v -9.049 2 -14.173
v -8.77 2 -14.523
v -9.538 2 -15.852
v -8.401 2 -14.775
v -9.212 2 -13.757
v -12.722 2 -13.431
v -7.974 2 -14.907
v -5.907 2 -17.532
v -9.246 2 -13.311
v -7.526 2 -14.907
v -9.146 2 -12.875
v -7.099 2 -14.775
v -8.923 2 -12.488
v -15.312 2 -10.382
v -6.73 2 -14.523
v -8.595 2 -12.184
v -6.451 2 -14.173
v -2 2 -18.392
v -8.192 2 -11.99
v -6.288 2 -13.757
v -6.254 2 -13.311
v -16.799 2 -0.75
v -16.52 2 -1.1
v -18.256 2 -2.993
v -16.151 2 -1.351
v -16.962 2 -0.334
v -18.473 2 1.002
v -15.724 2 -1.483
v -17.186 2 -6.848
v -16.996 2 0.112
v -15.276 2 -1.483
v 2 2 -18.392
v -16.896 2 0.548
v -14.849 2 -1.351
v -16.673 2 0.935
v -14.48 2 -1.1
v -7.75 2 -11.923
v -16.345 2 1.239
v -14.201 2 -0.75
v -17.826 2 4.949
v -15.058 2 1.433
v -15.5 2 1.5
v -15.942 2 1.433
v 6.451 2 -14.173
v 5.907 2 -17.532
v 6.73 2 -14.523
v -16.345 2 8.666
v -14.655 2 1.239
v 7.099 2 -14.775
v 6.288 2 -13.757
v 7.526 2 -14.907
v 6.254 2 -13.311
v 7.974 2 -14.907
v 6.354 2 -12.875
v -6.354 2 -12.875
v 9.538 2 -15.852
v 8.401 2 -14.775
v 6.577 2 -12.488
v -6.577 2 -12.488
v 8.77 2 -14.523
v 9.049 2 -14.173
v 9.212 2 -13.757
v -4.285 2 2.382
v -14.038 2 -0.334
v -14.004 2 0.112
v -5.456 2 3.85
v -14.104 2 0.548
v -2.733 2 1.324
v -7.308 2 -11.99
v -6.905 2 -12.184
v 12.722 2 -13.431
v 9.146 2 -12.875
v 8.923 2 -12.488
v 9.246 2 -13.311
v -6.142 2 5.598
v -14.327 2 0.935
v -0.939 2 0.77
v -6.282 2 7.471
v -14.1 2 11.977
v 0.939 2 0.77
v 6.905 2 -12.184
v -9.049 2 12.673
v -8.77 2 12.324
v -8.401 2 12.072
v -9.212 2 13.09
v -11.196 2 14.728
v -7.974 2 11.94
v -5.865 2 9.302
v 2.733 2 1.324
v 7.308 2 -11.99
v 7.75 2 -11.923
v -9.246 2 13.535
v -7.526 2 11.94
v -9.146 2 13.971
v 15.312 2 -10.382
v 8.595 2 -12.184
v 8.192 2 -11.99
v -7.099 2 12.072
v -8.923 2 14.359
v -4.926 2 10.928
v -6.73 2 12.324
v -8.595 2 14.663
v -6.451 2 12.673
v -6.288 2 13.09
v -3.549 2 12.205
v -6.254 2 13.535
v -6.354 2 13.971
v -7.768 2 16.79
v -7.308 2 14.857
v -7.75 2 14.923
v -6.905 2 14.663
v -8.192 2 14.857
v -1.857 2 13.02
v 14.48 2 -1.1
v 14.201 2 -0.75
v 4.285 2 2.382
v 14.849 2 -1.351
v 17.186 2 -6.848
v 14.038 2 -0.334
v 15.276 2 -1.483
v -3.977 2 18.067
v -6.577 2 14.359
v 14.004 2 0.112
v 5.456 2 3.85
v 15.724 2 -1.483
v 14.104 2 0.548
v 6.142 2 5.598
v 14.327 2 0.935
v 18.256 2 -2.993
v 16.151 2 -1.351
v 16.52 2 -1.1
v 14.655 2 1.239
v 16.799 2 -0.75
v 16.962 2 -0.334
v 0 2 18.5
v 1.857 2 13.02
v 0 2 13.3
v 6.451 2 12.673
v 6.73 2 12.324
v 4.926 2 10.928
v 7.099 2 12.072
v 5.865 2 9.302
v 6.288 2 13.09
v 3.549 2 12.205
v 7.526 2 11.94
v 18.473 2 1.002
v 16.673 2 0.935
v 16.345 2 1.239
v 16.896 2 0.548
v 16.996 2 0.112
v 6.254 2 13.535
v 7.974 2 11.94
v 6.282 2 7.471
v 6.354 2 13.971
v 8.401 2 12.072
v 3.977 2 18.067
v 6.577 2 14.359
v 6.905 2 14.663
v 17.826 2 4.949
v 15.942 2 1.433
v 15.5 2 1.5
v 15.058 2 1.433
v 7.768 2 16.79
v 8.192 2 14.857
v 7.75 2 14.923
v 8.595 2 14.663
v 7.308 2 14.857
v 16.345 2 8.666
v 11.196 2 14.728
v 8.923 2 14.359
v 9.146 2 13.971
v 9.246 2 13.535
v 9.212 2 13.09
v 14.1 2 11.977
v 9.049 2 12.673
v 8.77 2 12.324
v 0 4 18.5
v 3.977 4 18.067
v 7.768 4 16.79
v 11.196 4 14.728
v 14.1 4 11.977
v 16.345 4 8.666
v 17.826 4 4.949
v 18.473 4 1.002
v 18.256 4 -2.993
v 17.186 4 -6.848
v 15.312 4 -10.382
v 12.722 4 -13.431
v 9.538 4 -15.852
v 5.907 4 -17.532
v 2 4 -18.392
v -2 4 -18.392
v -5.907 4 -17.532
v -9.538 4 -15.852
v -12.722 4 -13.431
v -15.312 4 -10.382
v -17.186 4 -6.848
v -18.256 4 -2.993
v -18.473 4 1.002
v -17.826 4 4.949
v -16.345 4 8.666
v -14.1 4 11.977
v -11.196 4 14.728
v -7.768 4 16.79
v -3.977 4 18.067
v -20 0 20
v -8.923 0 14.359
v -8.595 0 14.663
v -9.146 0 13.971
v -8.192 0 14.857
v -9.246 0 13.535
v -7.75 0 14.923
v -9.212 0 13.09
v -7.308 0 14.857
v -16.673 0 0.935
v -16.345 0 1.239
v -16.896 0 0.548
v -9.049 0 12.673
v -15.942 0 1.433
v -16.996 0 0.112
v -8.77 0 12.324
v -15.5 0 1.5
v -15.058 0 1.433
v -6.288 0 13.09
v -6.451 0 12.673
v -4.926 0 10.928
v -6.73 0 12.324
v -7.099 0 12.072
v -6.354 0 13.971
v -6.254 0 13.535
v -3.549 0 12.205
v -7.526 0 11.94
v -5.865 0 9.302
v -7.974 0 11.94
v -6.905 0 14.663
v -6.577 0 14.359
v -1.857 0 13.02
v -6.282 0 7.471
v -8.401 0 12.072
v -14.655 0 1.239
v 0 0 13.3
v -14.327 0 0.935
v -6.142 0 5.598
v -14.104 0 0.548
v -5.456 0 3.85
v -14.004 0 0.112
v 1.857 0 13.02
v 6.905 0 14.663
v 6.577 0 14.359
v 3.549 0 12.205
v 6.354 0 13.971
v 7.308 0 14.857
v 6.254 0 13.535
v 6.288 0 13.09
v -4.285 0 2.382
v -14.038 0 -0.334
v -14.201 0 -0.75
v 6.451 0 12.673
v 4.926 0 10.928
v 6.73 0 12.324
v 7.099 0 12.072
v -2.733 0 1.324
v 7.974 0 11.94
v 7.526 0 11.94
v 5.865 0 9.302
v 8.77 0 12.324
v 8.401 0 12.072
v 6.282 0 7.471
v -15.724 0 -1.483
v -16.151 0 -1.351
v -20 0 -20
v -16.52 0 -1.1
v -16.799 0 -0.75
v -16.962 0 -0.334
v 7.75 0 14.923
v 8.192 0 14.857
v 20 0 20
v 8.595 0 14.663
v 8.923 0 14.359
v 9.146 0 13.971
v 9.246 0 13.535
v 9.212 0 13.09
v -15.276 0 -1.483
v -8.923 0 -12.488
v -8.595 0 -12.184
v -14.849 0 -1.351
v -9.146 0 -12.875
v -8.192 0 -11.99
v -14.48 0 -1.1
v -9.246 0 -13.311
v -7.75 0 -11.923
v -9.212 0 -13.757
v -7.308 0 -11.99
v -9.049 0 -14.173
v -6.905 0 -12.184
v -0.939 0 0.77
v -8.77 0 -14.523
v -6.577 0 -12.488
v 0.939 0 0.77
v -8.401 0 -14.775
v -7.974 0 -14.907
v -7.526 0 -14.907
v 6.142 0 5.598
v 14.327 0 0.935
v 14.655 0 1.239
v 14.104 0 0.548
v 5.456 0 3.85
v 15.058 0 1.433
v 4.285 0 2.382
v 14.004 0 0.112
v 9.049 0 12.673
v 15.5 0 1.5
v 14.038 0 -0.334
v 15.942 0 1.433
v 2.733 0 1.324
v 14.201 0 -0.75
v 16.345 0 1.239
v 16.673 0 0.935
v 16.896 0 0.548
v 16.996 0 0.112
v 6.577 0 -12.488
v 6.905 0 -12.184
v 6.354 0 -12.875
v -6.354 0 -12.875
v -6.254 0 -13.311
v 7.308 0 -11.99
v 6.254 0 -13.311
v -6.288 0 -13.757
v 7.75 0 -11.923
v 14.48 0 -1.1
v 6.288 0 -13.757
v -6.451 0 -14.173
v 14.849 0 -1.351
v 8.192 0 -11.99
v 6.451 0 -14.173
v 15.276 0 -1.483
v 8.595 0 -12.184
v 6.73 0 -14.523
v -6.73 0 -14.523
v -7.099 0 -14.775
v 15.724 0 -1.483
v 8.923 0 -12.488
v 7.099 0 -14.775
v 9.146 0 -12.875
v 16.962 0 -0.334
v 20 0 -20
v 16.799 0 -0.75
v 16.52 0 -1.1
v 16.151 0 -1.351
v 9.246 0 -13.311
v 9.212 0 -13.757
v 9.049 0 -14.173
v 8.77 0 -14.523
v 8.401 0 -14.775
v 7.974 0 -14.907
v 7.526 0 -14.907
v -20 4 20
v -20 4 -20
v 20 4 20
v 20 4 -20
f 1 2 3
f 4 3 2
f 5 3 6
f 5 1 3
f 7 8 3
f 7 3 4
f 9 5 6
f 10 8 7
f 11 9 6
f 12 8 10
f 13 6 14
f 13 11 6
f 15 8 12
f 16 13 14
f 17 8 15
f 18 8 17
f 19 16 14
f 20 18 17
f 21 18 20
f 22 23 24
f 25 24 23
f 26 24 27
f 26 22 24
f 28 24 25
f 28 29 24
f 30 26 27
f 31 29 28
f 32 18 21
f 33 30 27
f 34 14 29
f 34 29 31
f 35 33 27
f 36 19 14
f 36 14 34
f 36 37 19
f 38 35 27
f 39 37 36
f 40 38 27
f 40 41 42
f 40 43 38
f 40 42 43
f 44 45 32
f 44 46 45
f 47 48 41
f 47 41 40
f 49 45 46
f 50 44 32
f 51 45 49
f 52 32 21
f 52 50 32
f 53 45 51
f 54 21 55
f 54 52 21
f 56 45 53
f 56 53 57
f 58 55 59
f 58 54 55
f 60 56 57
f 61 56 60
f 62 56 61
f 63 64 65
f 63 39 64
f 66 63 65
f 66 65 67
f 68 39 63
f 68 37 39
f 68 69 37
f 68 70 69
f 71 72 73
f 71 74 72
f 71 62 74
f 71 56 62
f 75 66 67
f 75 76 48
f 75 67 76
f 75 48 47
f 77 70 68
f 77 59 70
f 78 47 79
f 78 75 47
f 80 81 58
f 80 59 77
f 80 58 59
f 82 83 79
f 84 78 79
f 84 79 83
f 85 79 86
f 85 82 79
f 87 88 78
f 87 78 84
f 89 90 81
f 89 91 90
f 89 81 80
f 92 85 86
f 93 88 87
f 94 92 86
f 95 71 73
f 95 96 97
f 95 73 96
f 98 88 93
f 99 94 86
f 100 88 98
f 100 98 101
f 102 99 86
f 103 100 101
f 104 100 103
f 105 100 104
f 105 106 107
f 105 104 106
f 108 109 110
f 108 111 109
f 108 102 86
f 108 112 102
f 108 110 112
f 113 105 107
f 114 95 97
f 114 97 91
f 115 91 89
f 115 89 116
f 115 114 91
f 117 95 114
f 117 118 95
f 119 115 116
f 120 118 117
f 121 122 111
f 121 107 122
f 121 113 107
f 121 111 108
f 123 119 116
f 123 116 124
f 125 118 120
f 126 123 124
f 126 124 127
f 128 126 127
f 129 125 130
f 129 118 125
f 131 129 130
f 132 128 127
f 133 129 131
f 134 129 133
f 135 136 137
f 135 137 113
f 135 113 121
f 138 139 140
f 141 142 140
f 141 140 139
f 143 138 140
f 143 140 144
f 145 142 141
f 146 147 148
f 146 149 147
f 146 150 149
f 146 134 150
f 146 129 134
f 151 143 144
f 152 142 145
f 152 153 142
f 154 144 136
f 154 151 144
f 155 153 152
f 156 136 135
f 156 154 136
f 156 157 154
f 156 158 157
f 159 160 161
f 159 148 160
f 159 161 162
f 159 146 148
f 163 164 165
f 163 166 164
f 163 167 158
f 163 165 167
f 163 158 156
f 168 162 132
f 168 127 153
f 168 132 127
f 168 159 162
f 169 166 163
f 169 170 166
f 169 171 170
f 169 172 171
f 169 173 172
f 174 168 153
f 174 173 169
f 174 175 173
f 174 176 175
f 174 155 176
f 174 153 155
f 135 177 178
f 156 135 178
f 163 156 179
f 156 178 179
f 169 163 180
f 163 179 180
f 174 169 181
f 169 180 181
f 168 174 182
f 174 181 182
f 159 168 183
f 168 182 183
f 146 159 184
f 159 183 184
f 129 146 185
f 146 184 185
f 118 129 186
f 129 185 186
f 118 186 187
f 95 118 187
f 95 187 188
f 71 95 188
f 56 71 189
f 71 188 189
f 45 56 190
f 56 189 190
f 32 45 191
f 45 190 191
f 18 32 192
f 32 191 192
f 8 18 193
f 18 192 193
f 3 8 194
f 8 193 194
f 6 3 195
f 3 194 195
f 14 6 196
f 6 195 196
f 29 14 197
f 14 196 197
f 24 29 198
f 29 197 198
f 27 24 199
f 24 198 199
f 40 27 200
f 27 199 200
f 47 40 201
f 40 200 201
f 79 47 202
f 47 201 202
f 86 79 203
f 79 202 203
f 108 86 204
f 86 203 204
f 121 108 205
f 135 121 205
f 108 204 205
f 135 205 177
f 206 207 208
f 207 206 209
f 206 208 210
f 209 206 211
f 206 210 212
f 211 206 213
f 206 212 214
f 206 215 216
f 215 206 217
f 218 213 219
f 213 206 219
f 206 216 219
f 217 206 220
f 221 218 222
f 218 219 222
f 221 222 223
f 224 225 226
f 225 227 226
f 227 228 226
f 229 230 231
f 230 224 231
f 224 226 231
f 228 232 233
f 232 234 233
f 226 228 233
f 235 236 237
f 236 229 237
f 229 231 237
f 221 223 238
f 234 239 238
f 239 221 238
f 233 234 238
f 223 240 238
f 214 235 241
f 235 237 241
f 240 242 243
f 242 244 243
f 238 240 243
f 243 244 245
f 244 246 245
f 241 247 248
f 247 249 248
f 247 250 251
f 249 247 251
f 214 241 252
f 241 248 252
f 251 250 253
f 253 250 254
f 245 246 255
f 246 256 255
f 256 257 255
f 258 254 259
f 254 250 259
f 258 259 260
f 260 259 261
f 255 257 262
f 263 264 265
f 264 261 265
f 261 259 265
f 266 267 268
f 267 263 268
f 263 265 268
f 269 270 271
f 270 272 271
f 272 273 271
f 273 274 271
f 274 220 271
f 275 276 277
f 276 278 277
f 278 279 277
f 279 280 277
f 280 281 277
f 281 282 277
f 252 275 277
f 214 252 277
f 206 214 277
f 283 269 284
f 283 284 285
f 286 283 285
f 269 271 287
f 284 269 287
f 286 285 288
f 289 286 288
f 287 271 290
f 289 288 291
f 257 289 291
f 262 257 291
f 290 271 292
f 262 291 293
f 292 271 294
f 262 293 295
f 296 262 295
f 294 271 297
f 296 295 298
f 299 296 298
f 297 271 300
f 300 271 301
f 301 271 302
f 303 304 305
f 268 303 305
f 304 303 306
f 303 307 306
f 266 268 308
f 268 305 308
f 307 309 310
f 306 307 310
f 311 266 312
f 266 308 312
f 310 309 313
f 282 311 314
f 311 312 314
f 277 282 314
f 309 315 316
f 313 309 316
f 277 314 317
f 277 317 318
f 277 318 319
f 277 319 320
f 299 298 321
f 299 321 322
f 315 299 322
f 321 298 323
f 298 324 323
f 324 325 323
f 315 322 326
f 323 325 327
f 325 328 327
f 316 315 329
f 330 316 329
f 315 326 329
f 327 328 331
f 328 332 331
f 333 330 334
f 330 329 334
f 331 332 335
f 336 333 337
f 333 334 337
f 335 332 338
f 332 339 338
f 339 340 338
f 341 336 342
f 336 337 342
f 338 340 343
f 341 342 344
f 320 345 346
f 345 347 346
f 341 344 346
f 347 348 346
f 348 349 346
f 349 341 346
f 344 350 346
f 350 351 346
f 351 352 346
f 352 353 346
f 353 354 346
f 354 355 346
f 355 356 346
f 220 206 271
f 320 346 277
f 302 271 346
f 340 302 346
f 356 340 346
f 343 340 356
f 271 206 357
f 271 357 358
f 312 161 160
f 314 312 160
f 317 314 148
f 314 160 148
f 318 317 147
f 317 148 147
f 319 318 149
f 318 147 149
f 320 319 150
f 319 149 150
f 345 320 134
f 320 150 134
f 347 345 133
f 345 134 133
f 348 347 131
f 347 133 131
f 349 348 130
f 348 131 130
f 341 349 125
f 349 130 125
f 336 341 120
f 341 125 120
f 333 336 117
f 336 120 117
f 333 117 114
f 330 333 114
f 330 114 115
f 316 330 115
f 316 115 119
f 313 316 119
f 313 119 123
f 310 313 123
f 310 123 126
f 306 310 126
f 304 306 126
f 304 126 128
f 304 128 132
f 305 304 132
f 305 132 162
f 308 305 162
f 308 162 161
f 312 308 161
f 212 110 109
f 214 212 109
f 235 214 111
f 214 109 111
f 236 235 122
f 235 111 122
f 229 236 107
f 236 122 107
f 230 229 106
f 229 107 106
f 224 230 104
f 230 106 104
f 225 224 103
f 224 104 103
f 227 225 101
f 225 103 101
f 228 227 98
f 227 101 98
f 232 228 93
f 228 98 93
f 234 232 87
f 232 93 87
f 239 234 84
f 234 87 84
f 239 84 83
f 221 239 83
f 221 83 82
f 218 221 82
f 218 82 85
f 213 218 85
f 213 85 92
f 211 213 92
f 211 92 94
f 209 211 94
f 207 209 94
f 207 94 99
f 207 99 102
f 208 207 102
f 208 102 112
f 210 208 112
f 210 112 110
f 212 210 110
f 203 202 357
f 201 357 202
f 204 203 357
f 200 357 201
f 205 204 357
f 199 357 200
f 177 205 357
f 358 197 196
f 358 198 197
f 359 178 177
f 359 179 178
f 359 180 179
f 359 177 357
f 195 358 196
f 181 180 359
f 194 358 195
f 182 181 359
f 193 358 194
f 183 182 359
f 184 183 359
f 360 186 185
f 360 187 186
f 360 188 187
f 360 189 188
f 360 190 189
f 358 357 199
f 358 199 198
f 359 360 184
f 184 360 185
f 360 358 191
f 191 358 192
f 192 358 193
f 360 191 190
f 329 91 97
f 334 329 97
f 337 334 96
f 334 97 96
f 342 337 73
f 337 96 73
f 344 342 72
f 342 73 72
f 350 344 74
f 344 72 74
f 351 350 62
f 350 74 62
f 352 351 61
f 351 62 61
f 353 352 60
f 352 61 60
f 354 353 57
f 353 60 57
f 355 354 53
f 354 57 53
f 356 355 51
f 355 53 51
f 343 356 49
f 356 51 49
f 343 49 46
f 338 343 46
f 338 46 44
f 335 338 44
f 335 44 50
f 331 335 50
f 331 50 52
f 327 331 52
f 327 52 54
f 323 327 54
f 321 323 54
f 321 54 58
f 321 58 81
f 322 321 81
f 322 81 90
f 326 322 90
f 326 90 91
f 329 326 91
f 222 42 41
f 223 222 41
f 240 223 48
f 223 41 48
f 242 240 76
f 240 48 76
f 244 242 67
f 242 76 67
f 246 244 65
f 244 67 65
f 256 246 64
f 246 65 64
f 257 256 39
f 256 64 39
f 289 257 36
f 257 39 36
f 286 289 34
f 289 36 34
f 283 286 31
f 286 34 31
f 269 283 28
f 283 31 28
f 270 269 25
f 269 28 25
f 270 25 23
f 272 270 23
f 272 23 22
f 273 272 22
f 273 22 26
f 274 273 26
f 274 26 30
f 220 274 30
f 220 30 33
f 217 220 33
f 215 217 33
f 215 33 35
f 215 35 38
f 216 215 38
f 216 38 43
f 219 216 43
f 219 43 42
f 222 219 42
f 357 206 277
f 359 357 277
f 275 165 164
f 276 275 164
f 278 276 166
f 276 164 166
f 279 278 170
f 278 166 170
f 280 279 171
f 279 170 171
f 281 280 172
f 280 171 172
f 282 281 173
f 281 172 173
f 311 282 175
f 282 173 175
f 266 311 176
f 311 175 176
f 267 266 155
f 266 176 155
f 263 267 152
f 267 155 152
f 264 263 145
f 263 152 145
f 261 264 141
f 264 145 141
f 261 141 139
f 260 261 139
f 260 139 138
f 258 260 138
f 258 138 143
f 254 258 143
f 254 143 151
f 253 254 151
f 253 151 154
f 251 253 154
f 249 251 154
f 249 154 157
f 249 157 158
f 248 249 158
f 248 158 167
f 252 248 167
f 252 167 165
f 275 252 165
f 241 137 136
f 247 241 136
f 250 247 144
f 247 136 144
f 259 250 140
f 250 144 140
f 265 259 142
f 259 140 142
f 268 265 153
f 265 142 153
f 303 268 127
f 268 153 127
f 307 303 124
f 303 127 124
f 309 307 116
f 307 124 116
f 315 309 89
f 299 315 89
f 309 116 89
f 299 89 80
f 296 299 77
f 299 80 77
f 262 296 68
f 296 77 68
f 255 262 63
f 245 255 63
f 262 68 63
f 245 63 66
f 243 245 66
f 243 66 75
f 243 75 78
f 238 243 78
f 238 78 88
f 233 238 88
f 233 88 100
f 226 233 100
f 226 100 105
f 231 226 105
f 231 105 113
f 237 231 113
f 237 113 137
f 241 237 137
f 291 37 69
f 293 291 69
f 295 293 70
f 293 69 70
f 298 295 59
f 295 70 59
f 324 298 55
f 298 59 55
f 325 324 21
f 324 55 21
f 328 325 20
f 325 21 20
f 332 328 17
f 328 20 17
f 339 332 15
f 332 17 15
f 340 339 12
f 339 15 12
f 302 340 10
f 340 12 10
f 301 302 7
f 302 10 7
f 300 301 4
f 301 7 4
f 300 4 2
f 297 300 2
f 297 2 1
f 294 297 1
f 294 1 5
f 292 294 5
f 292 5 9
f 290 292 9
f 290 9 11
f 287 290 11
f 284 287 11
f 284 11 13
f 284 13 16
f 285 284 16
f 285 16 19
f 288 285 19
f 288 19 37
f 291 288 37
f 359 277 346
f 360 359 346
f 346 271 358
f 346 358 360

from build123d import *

# Parameters (mm, degrees)
SKETCH1_W           = 40
SKETCH1_H           = 40
BOSS_EXTRUDE1_DEPTH = 4
SKETCH2_R           = 6.3
SKETCH2_R_2         = 1.5
CUT_EXTRUDE2_DEPTH  = 5
SKETCH3_R           = 18.5
CUT_EXTRUDE3_DEPTH  = 2


with BuildPart() as part:
    # Sketch1 → Boss-Extrude1 (new body)
    with BuildSketch(Plane(origin=(0, 0, 0), x_dir=(1, 0, 0), z_dir=(0, 1, 0))):
        Rectangle(SKETCH1_W, SKETCH1_H)
    extrude(amount=BOSS_EXTRUDE1_DEPTH)

    # Sketch2 → Cut-Extrude2 (cut)
    with BuildSketch(Plane(origin=(0, 4, 0), x_dir=(1, 0, 0), z_dir=(0, 1, 0))):
        with Locations(Location((0, -7, 0), (0, 0, 270))):
            Circle(SKETCH2_R)
        with Locations(Location((15.5, 0, 0), (0, 0, 270))):
            Circle(SKETCH2_R_2)
        with Locations(Location((7.75, -13.423393759, 0), (0, 0, 270))):
            Circle(SKETCH2_R_2)
        with Locations(Location((-7.75, -13.423393759, 0), (0, 0, 270))):
            Circle(SKETCH2_R_2)
        with Locations(Location((-15.5, 0, 0), (0, 0, 270))):
            Circle(SKETCH2_R_2)
        with Locations(Location((-7.75, 13.423393759, 0), (0, 0, 270))):
            Circle(SKETCH2_R_2)
        with Locations(Location((7.75, 13.423393759, 0), (0, 0, 270))):
            Circle(SKETCH2_R_2)
    extrude(amount=-CUT_EXTRUDE2_DEPTH, mode=Mode.SUBTRACT)

    # Sketch3 → Cut-Extrude3 (cut)
    with BuildSketch(Plane(origin=(0, 4, 0), x_dir=(1, 0, 0), z_dir=(0, 1, 0))):
        with Locations(Location((0, 0, 0), (0, 0, 270))):
            Circle(SKETCH3_R)
    extrude(amount=-CUT_EXTRUDE3_DEPTH, mode=Mode.SUBTRACT)


solid = part.part
